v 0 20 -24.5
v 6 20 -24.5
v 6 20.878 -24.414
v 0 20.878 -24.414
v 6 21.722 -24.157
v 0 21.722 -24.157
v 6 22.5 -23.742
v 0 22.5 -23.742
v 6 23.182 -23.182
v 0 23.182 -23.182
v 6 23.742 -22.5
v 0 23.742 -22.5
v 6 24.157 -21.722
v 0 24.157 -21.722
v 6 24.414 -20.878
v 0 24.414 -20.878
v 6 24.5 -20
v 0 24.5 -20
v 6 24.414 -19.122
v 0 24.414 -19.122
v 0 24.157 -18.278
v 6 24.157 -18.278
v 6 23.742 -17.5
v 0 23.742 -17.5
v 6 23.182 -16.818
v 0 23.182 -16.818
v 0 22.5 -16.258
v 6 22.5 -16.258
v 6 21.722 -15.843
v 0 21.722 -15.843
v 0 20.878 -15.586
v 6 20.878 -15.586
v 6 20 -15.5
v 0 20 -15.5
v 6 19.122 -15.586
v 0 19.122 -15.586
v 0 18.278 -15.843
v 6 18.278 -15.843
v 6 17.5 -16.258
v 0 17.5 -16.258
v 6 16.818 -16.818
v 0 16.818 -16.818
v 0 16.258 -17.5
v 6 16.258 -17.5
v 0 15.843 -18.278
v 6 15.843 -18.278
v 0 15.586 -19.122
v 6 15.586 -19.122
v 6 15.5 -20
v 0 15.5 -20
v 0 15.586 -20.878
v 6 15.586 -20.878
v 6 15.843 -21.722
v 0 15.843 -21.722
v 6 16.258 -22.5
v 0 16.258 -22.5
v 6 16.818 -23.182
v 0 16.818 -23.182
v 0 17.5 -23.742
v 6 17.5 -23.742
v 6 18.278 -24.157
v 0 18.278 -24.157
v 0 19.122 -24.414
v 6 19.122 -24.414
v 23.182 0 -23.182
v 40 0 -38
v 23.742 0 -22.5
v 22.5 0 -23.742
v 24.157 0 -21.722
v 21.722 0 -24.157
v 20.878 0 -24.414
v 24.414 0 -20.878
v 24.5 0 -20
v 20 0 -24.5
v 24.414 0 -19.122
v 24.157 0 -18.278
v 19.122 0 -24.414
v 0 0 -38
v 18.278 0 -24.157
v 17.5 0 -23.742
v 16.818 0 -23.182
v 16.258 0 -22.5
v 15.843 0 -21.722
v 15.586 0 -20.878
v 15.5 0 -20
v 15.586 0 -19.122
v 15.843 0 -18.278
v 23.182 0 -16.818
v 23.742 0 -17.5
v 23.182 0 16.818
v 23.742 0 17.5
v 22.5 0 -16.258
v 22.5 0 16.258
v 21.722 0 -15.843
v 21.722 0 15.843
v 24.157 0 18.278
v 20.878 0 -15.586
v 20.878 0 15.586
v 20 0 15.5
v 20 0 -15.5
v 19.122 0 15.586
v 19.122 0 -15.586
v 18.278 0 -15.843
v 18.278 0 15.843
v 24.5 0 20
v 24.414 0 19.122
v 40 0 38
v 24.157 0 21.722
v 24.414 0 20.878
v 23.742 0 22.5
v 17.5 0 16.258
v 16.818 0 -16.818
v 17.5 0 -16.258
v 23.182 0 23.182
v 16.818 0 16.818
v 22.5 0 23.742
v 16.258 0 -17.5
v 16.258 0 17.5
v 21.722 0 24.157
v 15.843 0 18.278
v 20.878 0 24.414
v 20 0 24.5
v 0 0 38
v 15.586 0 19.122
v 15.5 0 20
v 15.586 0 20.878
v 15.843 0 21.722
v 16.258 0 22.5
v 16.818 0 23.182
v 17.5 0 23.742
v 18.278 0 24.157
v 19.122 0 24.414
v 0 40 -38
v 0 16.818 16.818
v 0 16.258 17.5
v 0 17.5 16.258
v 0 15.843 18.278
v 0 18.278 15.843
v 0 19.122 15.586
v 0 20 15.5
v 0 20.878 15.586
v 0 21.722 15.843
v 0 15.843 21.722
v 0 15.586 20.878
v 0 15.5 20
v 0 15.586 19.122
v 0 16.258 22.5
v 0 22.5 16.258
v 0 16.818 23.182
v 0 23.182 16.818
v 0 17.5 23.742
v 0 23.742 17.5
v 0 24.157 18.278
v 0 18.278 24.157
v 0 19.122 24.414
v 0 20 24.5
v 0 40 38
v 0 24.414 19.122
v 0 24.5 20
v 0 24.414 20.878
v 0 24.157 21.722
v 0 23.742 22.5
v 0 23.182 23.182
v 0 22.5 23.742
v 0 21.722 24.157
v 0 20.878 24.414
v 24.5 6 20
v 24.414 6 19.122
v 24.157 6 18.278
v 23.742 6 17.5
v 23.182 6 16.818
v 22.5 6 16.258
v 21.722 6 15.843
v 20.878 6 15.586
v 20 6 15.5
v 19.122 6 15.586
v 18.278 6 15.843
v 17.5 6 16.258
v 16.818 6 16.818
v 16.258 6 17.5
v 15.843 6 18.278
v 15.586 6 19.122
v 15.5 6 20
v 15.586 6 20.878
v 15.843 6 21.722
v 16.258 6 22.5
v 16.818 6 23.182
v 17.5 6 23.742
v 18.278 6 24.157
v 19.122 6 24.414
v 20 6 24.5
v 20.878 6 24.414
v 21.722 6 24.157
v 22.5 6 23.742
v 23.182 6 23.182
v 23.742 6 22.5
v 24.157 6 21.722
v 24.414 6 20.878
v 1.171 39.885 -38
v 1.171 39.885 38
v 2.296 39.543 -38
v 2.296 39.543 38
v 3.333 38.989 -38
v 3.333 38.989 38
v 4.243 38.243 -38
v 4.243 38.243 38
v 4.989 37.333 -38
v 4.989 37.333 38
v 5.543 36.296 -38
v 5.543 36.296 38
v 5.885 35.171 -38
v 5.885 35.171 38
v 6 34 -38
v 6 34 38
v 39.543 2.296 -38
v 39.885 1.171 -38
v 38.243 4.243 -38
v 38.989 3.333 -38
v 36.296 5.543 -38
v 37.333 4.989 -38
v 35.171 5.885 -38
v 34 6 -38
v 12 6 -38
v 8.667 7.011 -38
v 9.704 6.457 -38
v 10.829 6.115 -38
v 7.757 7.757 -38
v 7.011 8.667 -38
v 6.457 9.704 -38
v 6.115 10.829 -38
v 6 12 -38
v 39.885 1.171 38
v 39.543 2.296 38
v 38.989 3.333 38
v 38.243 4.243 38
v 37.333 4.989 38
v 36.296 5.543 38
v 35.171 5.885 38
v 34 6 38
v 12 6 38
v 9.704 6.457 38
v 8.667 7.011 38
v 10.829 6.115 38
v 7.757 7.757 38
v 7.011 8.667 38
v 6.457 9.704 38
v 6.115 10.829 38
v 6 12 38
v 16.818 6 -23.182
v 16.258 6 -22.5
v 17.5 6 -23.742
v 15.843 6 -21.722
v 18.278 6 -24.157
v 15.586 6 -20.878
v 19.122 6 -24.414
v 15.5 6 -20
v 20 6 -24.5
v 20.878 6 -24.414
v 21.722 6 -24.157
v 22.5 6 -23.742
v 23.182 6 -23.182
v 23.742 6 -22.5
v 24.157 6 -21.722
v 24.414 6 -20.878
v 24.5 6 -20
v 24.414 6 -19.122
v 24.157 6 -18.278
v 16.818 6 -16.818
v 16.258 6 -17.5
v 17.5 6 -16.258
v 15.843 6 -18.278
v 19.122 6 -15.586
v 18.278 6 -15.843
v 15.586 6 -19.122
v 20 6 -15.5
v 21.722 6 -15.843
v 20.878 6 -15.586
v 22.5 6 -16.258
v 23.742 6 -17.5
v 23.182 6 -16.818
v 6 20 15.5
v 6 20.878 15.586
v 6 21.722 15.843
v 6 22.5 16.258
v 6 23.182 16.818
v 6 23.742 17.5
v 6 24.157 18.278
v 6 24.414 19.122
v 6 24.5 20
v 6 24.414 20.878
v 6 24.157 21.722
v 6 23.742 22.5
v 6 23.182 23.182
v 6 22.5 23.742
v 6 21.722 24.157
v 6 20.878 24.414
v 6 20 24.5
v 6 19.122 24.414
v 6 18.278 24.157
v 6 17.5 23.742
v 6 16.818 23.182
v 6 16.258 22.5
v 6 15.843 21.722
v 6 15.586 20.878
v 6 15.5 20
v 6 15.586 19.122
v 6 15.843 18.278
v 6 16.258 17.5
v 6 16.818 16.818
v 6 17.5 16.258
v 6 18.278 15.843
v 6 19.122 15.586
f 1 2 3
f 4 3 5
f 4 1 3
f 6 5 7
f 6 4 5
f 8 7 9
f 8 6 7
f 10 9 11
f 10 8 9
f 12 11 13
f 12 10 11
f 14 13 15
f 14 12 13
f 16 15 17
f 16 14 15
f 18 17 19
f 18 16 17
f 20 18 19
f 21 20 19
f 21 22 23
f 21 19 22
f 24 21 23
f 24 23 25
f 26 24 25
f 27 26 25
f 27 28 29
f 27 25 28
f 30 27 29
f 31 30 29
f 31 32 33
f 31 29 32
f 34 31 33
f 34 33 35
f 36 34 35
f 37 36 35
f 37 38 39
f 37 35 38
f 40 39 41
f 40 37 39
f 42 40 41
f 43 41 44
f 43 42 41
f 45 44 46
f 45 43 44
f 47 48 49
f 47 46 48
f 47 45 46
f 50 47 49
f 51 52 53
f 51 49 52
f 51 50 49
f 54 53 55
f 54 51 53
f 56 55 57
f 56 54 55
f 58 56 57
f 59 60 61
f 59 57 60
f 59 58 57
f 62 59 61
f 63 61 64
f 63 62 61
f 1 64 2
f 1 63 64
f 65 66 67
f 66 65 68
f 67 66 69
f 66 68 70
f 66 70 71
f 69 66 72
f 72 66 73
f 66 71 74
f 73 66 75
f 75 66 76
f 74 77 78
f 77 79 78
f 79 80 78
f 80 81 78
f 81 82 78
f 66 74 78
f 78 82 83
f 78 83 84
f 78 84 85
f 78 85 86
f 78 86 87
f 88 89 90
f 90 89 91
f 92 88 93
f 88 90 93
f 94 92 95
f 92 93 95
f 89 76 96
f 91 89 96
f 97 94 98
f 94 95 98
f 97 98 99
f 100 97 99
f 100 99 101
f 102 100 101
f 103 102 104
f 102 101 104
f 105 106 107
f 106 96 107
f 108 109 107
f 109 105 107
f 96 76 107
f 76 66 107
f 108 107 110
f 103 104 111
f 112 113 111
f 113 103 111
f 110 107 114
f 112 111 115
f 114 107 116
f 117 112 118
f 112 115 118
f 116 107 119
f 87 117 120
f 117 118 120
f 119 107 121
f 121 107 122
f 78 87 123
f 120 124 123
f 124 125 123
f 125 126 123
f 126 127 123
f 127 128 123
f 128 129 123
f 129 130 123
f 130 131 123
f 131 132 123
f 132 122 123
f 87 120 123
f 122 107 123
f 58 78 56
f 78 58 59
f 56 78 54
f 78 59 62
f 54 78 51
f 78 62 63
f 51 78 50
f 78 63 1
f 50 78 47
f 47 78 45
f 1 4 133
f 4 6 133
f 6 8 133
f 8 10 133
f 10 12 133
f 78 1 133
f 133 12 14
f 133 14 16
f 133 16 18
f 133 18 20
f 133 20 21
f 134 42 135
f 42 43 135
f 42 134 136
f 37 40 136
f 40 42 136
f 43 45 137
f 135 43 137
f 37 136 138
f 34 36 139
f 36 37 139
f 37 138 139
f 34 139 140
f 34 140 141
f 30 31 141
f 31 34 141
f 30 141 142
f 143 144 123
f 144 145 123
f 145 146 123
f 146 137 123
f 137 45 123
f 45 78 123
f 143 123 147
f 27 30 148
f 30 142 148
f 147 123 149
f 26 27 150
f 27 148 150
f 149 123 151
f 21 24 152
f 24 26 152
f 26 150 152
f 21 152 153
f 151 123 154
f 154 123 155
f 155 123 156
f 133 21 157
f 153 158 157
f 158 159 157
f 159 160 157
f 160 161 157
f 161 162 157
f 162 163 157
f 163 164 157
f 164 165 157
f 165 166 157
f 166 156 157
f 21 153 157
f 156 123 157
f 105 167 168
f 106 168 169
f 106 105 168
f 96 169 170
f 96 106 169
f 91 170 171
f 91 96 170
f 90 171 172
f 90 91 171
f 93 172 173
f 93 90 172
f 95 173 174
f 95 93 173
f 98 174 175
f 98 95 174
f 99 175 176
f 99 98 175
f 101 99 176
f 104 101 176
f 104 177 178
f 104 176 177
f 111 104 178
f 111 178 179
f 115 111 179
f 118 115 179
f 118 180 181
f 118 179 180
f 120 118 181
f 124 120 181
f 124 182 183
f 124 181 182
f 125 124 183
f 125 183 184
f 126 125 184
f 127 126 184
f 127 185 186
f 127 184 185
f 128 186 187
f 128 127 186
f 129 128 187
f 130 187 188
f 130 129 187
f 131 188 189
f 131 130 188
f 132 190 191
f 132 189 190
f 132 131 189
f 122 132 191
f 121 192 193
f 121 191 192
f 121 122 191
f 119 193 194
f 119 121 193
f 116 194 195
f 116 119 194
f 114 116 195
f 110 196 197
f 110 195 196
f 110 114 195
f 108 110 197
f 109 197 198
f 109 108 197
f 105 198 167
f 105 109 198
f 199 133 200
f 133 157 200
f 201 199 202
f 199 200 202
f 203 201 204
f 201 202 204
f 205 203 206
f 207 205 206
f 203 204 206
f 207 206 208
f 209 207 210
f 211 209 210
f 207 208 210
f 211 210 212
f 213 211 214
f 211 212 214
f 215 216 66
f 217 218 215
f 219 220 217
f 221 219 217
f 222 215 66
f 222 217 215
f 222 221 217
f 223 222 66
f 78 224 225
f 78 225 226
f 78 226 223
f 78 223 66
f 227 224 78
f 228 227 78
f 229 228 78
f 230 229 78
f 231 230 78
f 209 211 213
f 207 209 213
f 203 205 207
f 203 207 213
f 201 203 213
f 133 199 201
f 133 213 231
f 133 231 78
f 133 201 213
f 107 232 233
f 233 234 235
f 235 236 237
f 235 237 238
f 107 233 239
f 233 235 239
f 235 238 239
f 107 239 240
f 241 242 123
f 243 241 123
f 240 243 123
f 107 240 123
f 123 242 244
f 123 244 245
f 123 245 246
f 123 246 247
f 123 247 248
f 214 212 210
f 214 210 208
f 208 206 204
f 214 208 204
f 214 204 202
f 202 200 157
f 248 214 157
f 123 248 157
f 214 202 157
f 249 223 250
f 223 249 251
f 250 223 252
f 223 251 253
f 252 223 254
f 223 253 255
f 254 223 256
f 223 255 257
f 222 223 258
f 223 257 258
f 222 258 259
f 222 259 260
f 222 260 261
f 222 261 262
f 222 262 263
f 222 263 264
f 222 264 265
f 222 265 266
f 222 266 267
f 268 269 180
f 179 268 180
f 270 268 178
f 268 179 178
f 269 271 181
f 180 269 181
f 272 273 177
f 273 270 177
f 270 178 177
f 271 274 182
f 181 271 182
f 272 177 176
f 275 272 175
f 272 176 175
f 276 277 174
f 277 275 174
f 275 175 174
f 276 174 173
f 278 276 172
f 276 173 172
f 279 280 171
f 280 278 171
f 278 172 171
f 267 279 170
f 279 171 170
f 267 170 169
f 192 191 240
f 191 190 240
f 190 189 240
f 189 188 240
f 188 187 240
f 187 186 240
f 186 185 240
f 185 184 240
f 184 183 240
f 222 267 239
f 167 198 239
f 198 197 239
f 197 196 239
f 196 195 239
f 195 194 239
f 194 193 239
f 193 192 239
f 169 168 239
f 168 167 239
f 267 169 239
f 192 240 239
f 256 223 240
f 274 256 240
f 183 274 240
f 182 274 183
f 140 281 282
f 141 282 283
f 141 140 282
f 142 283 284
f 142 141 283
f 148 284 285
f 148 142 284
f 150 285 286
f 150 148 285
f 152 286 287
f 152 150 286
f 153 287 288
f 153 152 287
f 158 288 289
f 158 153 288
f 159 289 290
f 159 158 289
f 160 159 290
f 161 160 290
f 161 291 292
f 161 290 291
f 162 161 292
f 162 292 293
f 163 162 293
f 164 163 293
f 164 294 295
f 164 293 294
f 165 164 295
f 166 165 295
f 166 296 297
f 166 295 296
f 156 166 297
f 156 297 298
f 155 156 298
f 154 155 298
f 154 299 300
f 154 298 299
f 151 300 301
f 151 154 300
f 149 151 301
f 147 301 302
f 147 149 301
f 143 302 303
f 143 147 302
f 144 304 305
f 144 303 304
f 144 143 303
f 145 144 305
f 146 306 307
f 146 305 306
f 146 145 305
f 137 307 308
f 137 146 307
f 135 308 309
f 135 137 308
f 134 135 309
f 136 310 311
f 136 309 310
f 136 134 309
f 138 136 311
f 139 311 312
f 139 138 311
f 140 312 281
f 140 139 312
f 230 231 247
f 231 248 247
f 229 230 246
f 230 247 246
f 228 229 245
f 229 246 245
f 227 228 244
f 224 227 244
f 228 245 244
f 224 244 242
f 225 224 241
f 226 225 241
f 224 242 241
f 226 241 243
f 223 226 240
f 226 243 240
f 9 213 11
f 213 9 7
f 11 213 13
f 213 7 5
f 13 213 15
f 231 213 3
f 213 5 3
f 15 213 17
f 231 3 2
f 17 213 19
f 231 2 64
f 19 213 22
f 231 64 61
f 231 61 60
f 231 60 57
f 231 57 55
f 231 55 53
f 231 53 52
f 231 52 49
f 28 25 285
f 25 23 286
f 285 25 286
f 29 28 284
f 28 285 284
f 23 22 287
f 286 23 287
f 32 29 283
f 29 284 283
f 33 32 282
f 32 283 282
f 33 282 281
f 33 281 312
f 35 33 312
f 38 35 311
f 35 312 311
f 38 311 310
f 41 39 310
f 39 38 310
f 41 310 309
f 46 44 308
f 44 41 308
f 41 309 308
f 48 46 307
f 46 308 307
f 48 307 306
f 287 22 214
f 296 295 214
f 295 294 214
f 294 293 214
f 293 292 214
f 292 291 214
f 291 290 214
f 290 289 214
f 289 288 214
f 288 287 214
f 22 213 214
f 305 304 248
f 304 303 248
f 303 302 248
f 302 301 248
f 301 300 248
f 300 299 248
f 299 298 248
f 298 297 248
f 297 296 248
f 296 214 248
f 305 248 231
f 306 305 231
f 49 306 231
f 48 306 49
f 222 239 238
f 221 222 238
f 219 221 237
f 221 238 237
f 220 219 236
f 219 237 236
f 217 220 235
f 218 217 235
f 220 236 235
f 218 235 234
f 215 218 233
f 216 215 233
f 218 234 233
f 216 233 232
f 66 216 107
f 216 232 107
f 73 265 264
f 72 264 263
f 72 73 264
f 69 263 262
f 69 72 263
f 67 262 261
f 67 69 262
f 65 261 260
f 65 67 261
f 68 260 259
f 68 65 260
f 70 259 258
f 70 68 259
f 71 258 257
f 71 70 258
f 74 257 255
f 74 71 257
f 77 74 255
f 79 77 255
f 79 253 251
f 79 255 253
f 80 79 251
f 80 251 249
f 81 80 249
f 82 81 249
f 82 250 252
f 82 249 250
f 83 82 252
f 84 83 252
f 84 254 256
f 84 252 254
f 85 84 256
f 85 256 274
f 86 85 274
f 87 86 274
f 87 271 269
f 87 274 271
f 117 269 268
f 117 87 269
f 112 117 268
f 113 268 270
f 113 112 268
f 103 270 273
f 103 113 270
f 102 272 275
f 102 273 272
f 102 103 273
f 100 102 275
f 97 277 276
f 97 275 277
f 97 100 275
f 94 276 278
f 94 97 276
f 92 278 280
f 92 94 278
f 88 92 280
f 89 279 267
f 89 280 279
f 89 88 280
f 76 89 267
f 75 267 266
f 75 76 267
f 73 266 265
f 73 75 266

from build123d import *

# Parameters (mm, degrees)
BOSS_EXTRUDE1_DEPTH = 38
SKETCH2_R           = 4.5
CUT_EXTRUDE1_DEPTH  = 41
SKETCH3_R           = 4.5
CUT_EXTRUDE2_DEPTH  = 41


with BuildPart() as part:
    # Sketch1 → Boss-Extrude1 (new body, symmetric)
    with BuildSketch(Plane.XY):
        with BuildLine():
            Line((0, 0), (0, 40))
            ThreePointArc((0, 40), (4.242640687, 38.242640687), (6, 34))
            Line((6, 34), (6, 12))
            ThreePointArc((6, 12), (7.757359313, 7.757359313), (12, 6))
            Line((12, 6), (34, 6))
            ThreePointArc((34, 6), (38.242640687, 4.242640687), (40, 0))
            Line((40, 0), (0, 0))
        make_face()
    extrude(amount=BOSS_EXTRUDE1_DEPTH, both=True)

    # Sketch2 → Cut-Extrude1 (cut, through all)
    with BuildSketch(Plane(origin=(0, 0, 0), x_dir=(1, 0, 0), z_dir=(0, 1, 0))):
        with Locations((20, -20)):
            Circle(SKETCH2_R)
        with Locations((20, 20)):
            Circle(SKETCH2_R)
    extrude(amount=CUT_EXTRUDE1_DEPTH, mode=Mode.SUBTRACT)

    # Sketch3 → Cut-Extrude2 (cut, through all)
    with BuildSketch(Plane(origin=(0, 0, 0), x_dir=(0, 0, -1), z_dir=(1, 0, 0))):
        with Locations((-20, 20)):
            Circle(SKETCH3_R)
        with Locations((20, 20)):
            Circle(SKETCH3_R)
    extrude(amount=CUT_EXTRUDE2_DEPTH, mode=Mode.SUBTRACT)


solid = part.part
